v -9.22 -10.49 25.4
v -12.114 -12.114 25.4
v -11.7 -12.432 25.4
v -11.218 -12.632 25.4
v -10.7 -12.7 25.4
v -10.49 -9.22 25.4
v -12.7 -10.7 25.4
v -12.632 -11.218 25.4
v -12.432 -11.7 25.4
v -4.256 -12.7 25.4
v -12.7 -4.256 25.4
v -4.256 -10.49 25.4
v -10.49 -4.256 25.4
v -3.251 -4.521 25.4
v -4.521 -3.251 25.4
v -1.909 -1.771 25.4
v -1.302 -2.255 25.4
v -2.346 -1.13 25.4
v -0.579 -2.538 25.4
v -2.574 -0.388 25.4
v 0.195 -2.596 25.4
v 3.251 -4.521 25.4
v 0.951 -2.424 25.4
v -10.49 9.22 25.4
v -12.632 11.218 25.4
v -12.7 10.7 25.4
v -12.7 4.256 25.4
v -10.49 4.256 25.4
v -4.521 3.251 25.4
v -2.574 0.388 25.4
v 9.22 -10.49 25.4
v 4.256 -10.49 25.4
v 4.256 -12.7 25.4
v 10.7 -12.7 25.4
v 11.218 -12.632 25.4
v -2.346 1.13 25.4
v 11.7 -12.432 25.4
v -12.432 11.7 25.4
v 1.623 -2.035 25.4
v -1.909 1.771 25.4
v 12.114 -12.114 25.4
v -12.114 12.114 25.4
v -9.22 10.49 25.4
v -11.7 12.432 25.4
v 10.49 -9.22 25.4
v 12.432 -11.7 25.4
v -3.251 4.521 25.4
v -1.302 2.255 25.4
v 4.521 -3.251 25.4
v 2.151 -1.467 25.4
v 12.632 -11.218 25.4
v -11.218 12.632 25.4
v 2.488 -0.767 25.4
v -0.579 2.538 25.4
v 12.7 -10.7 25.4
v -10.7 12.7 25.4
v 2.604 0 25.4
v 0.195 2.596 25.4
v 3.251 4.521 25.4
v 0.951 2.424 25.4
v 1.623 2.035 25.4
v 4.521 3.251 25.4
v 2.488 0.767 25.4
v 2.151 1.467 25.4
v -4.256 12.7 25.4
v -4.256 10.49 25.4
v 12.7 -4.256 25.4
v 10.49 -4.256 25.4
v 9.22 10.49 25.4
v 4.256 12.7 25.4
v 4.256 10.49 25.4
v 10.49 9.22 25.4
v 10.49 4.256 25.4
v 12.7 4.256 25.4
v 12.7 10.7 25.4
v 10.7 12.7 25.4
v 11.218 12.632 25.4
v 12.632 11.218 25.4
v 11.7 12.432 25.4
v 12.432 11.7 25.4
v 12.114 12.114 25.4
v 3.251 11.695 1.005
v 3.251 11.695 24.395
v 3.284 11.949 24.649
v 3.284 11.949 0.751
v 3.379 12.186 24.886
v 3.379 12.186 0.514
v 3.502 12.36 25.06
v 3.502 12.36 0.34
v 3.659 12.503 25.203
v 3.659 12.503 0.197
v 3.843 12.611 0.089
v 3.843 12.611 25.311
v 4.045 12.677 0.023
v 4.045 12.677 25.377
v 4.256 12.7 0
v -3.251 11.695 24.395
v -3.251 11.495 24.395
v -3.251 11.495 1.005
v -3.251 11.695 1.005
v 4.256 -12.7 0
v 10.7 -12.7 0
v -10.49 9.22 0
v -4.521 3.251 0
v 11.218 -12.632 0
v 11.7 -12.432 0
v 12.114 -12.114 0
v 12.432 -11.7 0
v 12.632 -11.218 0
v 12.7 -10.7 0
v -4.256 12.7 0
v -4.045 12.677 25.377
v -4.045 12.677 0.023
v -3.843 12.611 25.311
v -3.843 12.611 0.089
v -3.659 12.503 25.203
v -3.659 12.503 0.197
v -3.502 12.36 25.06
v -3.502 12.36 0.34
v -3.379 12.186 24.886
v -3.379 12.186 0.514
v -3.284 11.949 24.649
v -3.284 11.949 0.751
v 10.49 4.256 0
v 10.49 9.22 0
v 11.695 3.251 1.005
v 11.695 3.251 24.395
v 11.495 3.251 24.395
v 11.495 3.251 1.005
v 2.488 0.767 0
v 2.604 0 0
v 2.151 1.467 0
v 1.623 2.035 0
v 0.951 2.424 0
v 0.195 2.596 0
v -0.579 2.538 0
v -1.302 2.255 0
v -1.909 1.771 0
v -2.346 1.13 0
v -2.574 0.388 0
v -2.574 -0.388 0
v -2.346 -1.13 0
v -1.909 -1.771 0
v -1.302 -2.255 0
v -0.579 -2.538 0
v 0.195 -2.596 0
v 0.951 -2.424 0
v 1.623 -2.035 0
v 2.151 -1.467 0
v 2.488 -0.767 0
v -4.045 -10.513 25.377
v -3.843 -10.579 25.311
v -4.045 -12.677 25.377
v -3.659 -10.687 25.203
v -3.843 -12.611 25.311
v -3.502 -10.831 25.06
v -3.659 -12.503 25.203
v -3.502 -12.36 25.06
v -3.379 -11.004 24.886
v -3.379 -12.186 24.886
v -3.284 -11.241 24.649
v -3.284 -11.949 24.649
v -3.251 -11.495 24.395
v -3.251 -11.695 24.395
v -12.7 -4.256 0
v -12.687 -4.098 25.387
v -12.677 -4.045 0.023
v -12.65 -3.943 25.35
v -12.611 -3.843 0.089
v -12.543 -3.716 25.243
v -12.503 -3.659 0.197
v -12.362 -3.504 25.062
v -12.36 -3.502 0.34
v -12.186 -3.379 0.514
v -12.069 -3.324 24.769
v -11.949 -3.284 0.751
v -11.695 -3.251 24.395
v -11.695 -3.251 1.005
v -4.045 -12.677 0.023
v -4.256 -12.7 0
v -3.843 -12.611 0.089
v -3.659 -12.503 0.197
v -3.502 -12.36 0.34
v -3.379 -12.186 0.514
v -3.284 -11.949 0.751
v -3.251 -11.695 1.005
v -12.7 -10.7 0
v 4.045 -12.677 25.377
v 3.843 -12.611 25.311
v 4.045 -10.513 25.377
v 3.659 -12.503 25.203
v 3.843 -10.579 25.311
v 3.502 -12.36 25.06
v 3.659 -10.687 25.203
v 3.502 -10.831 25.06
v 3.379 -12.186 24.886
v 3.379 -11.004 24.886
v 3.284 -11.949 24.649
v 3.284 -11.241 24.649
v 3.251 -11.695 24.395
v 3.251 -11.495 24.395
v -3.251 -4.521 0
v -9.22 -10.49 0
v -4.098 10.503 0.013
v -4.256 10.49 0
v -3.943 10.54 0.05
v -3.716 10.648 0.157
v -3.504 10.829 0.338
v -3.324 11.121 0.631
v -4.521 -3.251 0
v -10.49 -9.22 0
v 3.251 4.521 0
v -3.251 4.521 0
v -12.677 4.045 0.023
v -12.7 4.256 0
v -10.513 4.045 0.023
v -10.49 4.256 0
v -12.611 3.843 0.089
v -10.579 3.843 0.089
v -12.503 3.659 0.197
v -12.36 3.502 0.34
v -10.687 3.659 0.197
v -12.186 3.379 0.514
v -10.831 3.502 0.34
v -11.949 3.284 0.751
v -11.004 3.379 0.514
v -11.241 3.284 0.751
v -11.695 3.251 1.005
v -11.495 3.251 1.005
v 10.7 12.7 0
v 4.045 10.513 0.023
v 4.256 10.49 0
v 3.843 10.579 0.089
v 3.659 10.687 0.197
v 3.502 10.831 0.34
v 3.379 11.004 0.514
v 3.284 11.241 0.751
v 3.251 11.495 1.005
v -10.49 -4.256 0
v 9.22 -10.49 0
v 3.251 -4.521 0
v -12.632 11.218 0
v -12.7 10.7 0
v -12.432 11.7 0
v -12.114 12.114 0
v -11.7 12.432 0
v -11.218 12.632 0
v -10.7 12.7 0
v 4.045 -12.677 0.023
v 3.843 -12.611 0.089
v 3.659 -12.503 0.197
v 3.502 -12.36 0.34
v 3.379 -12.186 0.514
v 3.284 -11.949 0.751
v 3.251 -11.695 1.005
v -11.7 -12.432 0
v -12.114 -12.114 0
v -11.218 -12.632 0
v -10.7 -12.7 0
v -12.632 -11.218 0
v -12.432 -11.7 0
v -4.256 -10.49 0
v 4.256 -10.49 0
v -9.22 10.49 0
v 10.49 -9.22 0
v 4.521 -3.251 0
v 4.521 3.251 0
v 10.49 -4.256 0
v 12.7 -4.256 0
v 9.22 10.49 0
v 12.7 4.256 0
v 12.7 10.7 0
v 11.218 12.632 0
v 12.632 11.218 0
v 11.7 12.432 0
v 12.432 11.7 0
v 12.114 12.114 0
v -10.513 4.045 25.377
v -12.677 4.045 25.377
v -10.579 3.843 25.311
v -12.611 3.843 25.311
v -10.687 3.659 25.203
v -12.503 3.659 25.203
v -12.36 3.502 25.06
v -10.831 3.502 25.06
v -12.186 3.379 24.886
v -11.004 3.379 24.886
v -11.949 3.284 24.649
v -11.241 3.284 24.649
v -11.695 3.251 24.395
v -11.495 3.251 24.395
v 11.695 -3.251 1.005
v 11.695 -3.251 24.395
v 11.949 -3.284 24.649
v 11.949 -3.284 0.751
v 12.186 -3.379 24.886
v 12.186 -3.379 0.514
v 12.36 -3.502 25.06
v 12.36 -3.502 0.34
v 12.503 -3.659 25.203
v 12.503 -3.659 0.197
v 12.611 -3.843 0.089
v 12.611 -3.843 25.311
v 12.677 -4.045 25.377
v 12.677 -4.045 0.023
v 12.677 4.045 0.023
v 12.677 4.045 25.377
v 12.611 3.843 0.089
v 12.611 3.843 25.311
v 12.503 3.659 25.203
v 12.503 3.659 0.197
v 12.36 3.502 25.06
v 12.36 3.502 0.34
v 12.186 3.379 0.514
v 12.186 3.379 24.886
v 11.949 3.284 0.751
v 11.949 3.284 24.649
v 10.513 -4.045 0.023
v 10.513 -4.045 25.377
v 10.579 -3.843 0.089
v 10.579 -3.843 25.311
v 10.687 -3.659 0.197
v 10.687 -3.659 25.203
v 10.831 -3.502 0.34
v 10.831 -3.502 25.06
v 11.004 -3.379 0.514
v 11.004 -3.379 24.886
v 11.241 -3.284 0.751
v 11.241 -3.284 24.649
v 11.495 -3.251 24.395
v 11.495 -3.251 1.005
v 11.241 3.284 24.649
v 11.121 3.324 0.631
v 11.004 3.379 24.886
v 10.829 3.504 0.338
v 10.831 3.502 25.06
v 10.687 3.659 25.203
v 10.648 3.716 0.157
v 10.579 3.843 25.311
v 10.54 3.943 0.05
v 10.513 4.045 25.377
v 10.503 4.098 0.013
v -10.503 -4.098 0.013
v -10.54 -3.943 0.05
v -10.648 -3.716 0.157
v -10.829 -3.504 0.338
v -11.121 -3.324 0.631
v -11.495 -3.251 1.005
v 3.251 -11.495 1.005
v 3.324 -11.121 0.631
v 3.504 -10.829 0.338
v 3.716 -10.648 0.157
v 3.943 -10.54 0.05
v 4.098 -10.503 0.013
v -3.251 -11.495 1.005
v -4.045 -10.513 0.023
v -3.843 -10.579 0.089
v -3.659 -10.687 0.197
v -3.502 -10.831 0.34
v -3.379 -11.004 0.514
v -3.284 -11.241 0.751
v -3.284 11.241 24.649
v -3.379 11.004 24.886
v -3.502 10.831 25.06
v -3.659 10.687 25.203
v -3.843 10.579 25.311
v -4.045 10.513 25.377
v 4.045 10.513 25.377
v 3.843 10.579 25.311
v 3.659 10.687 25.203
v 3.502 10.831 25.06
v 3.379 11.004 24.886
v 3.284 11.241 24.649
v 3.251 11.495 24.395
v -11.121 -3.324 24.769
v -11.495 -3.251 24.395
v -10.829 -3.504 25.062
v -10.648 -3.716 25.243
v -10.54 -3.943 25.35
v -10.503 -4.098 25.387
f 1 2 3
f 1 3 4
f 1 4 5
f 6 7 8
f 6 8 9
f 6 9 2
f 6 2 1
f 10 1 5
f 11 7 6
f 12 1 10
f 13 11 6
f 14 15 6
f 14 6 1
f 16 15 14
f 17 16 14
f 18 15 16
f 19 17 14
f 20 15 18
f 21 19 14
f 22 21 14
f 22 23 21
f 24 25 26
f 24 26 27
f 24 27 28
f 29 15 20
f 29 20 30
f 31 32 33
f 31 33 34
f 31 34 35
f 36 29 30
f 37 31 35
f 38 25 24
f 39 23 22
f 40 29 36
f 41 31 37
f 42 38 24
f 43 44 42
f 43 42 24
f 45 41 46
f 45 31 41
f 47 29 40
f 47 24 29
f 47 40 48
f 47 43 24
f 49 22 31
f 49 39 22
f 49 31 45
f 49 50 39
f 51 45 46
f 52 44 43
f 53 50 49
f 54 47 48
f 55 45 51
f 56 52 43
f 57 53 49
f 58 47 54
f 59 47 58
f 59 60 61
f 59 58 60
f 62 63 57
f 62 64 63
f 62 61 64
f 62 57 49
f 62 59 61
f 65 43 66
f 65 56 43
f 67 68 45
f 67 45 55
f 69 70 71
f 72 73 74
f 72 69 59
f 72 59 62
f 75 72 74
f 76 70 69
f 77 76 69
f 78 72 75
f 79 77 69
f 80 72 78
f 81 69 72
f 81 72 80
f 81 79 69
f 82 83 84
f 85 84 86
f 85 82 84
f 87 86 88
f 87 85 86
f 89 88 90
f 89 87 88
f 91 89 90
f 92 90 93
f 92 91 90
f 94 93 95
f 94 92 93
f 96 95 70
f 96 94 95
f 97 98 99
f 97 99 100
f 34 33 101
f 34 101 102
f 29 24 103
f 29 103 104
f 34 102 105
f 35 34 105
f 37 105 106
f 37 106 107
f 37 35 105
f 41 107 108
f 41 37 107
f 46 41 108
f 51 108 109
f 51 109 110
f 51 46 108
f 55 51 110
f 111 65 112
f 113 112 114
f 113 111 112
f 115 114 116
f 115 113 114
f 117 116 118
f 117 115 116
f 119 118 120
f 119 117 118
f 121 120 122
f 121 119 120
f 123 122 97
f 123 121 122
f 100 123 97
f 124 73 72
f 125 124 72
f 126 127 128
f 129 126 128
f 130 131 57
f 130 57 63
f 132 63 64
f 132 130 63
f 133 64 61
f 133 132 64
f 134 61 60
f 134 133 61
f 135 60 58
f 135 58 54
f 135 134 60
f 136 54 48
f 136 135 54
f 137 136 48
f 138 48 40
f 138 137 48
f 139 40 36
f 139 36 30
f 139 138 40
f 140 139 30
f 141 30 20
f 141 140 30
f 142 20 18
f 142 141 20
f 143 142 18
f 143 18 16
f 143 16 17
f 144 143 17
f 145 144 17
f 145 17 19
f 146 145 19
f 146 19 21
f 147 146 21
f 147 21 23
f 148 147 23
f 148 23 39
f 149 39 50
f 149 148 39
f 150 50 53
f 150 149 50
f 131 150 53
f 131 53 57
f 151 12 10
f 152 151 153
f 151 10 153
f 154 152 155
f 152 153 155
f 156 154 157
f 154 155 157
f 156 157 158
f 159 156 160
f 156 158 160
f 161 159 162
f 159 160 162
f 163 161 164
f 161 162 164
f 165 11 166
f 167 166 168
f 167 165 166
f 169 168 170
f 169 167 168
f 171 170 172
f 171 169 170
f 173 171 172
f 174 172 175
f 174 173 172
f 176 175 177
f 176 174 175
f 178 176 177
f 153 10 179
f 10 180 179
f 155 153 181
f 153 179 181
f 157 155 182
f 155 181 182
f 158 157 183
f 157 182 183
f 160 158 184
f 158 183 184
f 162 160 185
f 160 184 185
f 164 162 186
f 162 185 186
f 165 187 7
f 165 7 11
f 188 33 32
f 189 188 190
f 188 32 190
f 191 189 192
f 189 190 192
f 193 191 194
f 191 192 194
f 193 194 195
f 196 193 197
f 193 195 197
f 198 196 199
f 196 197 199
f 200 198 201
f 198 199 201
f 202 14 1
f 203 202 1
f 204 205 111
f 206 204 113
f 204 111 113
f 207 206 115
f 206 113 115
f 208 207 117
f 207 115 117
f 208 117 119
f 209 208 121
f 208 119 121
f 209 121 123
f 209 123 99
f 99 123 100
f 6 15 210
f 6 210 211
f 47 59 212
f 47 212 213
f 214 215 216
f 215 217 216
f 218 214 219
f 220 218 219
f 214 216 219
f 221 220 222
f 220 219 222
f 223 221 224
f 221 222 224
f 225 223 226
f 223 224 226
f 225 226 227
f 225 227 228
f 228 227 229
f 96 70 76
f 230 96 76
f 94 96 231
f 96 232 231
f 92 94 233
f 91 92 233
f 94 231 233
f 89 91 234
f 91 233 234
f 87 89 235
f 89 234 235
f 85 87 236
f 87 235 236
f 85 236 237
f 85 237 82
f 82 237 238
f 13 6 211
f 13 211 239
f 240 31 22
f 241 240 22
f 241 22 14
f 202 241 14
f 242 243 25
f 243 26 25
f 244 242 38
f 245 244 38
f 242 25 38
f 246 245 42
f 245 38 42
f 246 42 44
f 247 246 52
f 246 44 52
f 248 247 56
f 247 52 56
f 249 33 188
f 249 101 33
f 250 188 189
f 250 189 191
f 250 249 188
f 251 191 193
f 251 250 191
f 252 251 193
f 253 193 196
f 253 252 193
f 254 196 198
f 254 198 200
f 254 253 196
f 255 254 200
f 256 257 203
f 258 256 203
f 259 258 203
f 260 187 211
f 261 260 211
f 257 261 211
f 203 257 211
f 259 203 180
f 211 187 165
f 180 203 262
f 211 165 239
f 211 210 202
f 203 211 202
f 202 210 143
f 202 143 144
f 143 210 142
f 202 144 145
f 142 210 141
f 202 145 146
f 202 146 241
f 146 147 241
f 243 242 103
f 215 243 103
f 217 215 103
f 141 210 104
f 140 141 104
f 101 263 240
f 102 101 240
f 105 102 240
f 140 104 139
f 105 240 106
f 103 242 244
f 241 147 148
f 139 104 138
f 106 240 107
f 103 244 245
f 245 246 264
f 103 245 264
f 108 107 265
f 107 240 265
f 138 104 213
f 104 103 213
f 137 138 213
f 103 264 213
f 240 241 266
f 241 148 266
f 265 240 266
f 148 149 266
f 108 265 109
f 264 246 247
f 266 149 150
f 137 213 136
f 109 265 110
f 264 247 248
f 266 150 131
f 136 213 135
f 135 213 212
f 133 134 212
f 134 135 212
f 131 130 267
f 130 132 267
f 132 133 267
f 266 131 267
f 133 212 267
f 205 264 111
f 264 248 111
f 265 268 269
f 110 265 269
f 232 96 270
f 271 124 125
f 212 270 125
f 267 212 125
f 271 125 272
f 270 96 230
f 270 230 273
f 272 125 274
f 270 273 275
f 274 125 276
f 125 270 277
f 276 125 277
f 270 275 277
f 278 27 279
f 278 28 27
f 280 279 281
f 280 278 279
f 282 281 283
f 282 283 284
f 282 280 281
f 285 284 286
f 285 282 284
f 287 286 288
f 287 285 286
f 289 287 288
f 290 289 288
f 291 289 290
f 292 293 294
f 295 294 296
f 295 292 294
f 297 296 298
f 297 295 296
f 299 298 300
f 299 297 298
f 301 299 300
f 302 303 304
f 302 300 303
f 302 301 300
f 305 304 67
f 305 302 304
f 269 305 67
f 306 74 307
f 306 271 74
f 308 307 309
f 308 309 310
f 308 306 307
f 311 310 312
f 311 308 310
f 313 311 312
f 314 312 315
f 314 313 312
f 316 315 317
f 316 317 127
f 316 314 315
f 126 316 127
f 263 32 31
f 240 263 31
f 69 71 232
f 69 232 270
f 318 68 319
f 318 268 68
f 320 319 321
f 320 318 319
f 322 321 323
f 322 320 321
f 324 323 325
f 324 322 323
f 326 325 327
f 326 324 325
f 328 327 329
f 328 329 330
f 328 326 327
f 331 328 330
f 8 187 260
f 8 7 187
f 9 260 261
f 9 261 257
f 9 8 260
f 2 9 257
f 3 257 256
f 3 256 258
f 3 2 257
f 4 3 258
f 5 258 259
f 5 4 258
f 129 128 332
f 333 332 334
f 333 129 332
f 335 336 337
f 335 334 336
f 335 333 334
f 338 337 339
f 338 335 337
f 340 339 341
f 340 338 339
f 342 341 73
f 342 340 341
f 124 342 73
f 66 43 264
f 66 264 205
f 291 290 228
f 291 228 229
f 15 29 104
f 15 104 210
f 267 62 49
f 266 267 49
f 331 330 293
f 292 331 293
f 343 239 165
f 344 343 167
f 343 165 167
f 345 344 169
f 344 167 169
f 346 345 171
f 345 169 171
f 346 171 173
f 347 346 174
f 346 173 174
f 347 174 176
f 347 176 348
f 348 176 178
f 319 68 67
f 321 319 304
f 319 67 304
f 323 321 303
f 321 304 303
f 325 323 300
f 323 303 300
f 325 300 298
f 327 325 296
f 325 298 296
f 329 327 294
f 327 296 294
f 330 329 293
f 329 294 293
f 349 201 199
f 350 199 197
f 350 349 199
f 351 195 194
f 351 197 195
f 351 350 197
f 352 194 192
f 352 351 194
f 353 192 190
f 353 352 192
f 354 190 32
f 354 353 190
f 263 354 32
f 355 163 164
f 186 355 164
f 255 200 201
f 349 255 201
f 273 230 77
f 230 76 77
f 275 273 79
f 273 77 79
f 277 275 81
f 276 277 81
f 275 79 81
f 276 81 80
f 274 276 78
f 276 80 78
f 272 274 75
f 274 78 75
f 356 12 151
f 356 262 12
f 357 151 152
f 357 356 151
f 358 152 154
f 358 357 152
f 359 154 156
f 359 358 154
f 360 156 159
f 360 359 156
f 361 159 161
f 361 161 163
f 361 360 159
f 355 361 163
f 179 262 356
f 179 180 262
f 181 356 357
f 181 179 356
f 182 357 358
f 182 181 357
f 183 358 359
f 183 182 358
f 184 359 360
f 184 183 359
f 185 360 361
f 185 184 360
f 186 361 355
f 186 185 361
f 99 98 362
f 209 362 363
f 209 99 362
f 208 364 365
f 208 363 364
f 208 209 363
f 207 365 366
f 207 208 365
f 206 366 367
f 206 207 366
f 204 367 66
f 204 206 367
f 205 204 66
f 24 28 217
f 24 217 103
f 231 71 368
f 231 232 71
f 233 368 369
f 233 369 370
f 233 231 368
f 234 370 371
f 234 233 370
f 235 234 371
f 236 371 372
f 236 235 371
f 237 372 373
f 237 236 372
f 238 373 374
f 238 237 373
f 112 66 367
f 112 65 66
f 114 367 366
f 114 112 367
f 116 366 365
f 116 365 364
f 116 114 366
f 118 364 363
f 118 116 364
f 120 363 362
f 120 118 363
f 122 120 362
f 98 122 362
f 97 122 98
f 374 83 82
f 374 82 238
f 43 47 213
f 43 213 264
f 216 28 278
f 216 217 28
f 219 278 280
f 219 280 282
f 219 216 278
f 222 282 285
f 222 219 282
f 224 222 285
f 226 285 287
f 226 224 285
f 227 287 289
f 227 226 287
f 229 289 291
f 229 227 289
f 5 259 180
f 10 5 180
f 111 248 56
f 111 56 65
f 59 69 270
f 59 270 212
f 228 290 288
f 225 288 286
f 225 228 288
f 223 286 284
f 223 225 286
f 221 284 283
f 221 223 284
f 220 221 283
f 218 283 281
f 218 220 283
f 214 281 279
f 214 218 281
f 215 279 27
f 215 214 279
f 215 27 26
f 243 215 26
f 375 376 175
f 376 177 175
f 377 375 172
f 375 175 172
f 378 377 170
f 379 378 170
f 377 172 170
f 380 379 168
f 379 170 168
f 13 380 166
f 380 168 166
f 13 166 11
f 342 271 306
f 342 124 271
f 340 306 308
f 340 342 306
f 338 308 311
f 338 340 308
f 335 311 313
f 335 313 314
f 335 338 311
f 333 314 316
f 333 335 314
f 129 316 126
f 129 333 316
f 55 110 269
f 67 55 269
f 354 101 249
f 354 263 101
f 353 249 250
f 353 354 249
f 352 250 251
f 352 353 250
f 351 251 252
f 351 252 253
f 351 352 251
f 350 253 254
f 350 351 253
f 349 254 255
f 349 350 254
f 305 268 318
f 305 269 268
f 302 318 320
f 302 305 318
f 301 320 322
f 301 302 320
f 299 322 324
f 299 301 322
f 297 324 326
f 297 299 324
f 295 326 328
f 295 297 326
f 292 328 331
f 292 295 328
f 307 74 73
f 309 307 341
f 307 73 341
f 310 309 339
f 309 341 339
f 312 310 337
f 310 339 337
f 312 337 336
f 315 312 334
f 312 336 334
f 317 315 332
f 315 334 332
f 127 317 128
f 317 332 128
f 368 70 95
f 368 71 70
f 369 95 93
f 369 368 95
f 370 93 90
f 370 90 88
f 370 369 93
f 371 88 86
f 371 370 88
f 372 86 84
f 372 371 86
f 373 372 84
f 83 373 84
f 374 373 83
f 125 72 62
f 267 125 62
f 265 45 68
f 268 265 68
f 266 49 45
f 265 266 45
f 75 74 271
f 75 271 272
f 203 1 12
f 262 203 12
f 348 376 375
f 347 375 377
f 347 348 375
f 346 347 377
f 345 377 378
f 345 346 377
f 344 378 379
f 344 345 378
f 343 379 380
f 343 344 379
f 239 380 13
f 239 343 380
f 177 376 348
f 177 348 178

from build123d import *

# Parameters (mm, degrees)
SKETCH_W     = 25.4
SKETCH_H     = 25.4
SKETCH_R     = 2.6035
PAD_DEPTH    = 25.4
POCKET_DEPTH = 25.401
FILLET_R     = 1.0049
FILLET001_R  = 2


with BuildPart() as part:
    # Sketch → Pad (new body)
    with BuildSketch(Plane.XY):
        Rectangle(SKETCH_W, SKETCH_H)
        Circle(SKETCH_R, mode=Mode.SUBTRACT)
    extrude(amount=PAD_DEPTH)

    # Sketch001 (on Face7 of Pad) → Pocket (cut, through all)
    with BuildSketch(Plane.XY.offset(25.4)):
        Polygon((-3.2512, 12.7), (3.2512, 12.7), (3.2512, 10.4902), (9.2202, 10.4902), (3.2512, 4.5212), (-3.2512, 4.5212), (-9.2202, 10.4902), (-3.2512, 10.4902), align=None)
        Polygon((-4.5212, 3.2512), (-4.5212, -3.2512), (-10.4902, -9.2202), (-10.4902, -3.2512), (-12.7, -3.2512), (-12.7, 3.2512), (-10.4902, 3.2512), (-10.4902, 9.2202), align=None)
        Polygon((4.5212, 3.2512), (4.5212, -3.2512), (10.4902, -9.2202), (10.4902, -3.2512), (12.7, -3.2512), (12.7, 3.2512), (10.4902, 3.2512), (10.4902, 9.2202), align=None)
        Polygon((3.2512, -4.5212), (-3.2512, -4.5212), (-9.2202, -10.4902), (-3.2512, -10.4902), (-3.2512, -12.7), (3.2512, -12.7), (3.2512, -10.4902), (9.2202, -10.4902), align=None)
    extrude(amount=-POCKET_DEPTH, mode=Mode.SUBTRACT)

    # Fillet
    fillet_edges = [part.edges().sort_by_distance(p)[0] for p in [
        (-11.5951, 3.2512, 25.4),
        (-10.4902, 3.2512, 12.7),
        (-11.5951, 3.2512, 0),
        (-12.7, 3.2512, 12.7),
        (11.5951, 3.2512, 25.4),
        (10.4902, 3.2512, 12.7),
        (11.5951, 3.2512, 0),
        (12.7, 3.2512, 12.7),
        (11.5951, -3.2512, 25.4),
        (10.4902, -3.2512, 12.7),
        (11.5951, -3.2512, 0),
        (12.7, -3.2512, 12.7),
        (-11.5951, -3.2512, 25.4),
        (-10.4902, -3.2512, 12.7),
        (-11.5951, -3.2512, 0),
        (-12.7, -3.2512, 12.7),
        (-3.2512, 11.5951, 25.4),
        (-3.2512, 10.4902, 12.7),
        (-3.2512, 11.5951, 0),
        (-3.2512, 12.7, 12.7),
        (3.2512, 11.5951, 25.4),
        (3.2512, 10.4902, 12.7),
        (3.2512, 11.5951, 0),
        (3.2512, 12.7, 12.7),
        (-3.2512, -11.5951, 25.4),
        (-3.2512, -10.4902, 12.7),
        (-3.2512, -11.5951, 0),
        (-3.2512, -12.7, 12.7),
        (3.2512, -11.5951, 25.4),
        (3.2512, -10.4902, 12.7),
        (3.2512, -11.5951, 0),
        (3.2512, -12.7, 12.7),
    ]]
    fillet(fillet_edges, radius=FILLET_R)

    # Fillet001
    fillet001_edges = [part.edges().sort_by_distance(p)[0] for p in [
        (12.7, -12.7, 12.7),
        (12.7, 12.7, 12.7),
        (-12.7, -12.7, 12.7),
        (-12.7, 12.7, 12.7),
    ]]
    fillet(fillet001_edges, radius=FILLET001_R)


solid = part.part
